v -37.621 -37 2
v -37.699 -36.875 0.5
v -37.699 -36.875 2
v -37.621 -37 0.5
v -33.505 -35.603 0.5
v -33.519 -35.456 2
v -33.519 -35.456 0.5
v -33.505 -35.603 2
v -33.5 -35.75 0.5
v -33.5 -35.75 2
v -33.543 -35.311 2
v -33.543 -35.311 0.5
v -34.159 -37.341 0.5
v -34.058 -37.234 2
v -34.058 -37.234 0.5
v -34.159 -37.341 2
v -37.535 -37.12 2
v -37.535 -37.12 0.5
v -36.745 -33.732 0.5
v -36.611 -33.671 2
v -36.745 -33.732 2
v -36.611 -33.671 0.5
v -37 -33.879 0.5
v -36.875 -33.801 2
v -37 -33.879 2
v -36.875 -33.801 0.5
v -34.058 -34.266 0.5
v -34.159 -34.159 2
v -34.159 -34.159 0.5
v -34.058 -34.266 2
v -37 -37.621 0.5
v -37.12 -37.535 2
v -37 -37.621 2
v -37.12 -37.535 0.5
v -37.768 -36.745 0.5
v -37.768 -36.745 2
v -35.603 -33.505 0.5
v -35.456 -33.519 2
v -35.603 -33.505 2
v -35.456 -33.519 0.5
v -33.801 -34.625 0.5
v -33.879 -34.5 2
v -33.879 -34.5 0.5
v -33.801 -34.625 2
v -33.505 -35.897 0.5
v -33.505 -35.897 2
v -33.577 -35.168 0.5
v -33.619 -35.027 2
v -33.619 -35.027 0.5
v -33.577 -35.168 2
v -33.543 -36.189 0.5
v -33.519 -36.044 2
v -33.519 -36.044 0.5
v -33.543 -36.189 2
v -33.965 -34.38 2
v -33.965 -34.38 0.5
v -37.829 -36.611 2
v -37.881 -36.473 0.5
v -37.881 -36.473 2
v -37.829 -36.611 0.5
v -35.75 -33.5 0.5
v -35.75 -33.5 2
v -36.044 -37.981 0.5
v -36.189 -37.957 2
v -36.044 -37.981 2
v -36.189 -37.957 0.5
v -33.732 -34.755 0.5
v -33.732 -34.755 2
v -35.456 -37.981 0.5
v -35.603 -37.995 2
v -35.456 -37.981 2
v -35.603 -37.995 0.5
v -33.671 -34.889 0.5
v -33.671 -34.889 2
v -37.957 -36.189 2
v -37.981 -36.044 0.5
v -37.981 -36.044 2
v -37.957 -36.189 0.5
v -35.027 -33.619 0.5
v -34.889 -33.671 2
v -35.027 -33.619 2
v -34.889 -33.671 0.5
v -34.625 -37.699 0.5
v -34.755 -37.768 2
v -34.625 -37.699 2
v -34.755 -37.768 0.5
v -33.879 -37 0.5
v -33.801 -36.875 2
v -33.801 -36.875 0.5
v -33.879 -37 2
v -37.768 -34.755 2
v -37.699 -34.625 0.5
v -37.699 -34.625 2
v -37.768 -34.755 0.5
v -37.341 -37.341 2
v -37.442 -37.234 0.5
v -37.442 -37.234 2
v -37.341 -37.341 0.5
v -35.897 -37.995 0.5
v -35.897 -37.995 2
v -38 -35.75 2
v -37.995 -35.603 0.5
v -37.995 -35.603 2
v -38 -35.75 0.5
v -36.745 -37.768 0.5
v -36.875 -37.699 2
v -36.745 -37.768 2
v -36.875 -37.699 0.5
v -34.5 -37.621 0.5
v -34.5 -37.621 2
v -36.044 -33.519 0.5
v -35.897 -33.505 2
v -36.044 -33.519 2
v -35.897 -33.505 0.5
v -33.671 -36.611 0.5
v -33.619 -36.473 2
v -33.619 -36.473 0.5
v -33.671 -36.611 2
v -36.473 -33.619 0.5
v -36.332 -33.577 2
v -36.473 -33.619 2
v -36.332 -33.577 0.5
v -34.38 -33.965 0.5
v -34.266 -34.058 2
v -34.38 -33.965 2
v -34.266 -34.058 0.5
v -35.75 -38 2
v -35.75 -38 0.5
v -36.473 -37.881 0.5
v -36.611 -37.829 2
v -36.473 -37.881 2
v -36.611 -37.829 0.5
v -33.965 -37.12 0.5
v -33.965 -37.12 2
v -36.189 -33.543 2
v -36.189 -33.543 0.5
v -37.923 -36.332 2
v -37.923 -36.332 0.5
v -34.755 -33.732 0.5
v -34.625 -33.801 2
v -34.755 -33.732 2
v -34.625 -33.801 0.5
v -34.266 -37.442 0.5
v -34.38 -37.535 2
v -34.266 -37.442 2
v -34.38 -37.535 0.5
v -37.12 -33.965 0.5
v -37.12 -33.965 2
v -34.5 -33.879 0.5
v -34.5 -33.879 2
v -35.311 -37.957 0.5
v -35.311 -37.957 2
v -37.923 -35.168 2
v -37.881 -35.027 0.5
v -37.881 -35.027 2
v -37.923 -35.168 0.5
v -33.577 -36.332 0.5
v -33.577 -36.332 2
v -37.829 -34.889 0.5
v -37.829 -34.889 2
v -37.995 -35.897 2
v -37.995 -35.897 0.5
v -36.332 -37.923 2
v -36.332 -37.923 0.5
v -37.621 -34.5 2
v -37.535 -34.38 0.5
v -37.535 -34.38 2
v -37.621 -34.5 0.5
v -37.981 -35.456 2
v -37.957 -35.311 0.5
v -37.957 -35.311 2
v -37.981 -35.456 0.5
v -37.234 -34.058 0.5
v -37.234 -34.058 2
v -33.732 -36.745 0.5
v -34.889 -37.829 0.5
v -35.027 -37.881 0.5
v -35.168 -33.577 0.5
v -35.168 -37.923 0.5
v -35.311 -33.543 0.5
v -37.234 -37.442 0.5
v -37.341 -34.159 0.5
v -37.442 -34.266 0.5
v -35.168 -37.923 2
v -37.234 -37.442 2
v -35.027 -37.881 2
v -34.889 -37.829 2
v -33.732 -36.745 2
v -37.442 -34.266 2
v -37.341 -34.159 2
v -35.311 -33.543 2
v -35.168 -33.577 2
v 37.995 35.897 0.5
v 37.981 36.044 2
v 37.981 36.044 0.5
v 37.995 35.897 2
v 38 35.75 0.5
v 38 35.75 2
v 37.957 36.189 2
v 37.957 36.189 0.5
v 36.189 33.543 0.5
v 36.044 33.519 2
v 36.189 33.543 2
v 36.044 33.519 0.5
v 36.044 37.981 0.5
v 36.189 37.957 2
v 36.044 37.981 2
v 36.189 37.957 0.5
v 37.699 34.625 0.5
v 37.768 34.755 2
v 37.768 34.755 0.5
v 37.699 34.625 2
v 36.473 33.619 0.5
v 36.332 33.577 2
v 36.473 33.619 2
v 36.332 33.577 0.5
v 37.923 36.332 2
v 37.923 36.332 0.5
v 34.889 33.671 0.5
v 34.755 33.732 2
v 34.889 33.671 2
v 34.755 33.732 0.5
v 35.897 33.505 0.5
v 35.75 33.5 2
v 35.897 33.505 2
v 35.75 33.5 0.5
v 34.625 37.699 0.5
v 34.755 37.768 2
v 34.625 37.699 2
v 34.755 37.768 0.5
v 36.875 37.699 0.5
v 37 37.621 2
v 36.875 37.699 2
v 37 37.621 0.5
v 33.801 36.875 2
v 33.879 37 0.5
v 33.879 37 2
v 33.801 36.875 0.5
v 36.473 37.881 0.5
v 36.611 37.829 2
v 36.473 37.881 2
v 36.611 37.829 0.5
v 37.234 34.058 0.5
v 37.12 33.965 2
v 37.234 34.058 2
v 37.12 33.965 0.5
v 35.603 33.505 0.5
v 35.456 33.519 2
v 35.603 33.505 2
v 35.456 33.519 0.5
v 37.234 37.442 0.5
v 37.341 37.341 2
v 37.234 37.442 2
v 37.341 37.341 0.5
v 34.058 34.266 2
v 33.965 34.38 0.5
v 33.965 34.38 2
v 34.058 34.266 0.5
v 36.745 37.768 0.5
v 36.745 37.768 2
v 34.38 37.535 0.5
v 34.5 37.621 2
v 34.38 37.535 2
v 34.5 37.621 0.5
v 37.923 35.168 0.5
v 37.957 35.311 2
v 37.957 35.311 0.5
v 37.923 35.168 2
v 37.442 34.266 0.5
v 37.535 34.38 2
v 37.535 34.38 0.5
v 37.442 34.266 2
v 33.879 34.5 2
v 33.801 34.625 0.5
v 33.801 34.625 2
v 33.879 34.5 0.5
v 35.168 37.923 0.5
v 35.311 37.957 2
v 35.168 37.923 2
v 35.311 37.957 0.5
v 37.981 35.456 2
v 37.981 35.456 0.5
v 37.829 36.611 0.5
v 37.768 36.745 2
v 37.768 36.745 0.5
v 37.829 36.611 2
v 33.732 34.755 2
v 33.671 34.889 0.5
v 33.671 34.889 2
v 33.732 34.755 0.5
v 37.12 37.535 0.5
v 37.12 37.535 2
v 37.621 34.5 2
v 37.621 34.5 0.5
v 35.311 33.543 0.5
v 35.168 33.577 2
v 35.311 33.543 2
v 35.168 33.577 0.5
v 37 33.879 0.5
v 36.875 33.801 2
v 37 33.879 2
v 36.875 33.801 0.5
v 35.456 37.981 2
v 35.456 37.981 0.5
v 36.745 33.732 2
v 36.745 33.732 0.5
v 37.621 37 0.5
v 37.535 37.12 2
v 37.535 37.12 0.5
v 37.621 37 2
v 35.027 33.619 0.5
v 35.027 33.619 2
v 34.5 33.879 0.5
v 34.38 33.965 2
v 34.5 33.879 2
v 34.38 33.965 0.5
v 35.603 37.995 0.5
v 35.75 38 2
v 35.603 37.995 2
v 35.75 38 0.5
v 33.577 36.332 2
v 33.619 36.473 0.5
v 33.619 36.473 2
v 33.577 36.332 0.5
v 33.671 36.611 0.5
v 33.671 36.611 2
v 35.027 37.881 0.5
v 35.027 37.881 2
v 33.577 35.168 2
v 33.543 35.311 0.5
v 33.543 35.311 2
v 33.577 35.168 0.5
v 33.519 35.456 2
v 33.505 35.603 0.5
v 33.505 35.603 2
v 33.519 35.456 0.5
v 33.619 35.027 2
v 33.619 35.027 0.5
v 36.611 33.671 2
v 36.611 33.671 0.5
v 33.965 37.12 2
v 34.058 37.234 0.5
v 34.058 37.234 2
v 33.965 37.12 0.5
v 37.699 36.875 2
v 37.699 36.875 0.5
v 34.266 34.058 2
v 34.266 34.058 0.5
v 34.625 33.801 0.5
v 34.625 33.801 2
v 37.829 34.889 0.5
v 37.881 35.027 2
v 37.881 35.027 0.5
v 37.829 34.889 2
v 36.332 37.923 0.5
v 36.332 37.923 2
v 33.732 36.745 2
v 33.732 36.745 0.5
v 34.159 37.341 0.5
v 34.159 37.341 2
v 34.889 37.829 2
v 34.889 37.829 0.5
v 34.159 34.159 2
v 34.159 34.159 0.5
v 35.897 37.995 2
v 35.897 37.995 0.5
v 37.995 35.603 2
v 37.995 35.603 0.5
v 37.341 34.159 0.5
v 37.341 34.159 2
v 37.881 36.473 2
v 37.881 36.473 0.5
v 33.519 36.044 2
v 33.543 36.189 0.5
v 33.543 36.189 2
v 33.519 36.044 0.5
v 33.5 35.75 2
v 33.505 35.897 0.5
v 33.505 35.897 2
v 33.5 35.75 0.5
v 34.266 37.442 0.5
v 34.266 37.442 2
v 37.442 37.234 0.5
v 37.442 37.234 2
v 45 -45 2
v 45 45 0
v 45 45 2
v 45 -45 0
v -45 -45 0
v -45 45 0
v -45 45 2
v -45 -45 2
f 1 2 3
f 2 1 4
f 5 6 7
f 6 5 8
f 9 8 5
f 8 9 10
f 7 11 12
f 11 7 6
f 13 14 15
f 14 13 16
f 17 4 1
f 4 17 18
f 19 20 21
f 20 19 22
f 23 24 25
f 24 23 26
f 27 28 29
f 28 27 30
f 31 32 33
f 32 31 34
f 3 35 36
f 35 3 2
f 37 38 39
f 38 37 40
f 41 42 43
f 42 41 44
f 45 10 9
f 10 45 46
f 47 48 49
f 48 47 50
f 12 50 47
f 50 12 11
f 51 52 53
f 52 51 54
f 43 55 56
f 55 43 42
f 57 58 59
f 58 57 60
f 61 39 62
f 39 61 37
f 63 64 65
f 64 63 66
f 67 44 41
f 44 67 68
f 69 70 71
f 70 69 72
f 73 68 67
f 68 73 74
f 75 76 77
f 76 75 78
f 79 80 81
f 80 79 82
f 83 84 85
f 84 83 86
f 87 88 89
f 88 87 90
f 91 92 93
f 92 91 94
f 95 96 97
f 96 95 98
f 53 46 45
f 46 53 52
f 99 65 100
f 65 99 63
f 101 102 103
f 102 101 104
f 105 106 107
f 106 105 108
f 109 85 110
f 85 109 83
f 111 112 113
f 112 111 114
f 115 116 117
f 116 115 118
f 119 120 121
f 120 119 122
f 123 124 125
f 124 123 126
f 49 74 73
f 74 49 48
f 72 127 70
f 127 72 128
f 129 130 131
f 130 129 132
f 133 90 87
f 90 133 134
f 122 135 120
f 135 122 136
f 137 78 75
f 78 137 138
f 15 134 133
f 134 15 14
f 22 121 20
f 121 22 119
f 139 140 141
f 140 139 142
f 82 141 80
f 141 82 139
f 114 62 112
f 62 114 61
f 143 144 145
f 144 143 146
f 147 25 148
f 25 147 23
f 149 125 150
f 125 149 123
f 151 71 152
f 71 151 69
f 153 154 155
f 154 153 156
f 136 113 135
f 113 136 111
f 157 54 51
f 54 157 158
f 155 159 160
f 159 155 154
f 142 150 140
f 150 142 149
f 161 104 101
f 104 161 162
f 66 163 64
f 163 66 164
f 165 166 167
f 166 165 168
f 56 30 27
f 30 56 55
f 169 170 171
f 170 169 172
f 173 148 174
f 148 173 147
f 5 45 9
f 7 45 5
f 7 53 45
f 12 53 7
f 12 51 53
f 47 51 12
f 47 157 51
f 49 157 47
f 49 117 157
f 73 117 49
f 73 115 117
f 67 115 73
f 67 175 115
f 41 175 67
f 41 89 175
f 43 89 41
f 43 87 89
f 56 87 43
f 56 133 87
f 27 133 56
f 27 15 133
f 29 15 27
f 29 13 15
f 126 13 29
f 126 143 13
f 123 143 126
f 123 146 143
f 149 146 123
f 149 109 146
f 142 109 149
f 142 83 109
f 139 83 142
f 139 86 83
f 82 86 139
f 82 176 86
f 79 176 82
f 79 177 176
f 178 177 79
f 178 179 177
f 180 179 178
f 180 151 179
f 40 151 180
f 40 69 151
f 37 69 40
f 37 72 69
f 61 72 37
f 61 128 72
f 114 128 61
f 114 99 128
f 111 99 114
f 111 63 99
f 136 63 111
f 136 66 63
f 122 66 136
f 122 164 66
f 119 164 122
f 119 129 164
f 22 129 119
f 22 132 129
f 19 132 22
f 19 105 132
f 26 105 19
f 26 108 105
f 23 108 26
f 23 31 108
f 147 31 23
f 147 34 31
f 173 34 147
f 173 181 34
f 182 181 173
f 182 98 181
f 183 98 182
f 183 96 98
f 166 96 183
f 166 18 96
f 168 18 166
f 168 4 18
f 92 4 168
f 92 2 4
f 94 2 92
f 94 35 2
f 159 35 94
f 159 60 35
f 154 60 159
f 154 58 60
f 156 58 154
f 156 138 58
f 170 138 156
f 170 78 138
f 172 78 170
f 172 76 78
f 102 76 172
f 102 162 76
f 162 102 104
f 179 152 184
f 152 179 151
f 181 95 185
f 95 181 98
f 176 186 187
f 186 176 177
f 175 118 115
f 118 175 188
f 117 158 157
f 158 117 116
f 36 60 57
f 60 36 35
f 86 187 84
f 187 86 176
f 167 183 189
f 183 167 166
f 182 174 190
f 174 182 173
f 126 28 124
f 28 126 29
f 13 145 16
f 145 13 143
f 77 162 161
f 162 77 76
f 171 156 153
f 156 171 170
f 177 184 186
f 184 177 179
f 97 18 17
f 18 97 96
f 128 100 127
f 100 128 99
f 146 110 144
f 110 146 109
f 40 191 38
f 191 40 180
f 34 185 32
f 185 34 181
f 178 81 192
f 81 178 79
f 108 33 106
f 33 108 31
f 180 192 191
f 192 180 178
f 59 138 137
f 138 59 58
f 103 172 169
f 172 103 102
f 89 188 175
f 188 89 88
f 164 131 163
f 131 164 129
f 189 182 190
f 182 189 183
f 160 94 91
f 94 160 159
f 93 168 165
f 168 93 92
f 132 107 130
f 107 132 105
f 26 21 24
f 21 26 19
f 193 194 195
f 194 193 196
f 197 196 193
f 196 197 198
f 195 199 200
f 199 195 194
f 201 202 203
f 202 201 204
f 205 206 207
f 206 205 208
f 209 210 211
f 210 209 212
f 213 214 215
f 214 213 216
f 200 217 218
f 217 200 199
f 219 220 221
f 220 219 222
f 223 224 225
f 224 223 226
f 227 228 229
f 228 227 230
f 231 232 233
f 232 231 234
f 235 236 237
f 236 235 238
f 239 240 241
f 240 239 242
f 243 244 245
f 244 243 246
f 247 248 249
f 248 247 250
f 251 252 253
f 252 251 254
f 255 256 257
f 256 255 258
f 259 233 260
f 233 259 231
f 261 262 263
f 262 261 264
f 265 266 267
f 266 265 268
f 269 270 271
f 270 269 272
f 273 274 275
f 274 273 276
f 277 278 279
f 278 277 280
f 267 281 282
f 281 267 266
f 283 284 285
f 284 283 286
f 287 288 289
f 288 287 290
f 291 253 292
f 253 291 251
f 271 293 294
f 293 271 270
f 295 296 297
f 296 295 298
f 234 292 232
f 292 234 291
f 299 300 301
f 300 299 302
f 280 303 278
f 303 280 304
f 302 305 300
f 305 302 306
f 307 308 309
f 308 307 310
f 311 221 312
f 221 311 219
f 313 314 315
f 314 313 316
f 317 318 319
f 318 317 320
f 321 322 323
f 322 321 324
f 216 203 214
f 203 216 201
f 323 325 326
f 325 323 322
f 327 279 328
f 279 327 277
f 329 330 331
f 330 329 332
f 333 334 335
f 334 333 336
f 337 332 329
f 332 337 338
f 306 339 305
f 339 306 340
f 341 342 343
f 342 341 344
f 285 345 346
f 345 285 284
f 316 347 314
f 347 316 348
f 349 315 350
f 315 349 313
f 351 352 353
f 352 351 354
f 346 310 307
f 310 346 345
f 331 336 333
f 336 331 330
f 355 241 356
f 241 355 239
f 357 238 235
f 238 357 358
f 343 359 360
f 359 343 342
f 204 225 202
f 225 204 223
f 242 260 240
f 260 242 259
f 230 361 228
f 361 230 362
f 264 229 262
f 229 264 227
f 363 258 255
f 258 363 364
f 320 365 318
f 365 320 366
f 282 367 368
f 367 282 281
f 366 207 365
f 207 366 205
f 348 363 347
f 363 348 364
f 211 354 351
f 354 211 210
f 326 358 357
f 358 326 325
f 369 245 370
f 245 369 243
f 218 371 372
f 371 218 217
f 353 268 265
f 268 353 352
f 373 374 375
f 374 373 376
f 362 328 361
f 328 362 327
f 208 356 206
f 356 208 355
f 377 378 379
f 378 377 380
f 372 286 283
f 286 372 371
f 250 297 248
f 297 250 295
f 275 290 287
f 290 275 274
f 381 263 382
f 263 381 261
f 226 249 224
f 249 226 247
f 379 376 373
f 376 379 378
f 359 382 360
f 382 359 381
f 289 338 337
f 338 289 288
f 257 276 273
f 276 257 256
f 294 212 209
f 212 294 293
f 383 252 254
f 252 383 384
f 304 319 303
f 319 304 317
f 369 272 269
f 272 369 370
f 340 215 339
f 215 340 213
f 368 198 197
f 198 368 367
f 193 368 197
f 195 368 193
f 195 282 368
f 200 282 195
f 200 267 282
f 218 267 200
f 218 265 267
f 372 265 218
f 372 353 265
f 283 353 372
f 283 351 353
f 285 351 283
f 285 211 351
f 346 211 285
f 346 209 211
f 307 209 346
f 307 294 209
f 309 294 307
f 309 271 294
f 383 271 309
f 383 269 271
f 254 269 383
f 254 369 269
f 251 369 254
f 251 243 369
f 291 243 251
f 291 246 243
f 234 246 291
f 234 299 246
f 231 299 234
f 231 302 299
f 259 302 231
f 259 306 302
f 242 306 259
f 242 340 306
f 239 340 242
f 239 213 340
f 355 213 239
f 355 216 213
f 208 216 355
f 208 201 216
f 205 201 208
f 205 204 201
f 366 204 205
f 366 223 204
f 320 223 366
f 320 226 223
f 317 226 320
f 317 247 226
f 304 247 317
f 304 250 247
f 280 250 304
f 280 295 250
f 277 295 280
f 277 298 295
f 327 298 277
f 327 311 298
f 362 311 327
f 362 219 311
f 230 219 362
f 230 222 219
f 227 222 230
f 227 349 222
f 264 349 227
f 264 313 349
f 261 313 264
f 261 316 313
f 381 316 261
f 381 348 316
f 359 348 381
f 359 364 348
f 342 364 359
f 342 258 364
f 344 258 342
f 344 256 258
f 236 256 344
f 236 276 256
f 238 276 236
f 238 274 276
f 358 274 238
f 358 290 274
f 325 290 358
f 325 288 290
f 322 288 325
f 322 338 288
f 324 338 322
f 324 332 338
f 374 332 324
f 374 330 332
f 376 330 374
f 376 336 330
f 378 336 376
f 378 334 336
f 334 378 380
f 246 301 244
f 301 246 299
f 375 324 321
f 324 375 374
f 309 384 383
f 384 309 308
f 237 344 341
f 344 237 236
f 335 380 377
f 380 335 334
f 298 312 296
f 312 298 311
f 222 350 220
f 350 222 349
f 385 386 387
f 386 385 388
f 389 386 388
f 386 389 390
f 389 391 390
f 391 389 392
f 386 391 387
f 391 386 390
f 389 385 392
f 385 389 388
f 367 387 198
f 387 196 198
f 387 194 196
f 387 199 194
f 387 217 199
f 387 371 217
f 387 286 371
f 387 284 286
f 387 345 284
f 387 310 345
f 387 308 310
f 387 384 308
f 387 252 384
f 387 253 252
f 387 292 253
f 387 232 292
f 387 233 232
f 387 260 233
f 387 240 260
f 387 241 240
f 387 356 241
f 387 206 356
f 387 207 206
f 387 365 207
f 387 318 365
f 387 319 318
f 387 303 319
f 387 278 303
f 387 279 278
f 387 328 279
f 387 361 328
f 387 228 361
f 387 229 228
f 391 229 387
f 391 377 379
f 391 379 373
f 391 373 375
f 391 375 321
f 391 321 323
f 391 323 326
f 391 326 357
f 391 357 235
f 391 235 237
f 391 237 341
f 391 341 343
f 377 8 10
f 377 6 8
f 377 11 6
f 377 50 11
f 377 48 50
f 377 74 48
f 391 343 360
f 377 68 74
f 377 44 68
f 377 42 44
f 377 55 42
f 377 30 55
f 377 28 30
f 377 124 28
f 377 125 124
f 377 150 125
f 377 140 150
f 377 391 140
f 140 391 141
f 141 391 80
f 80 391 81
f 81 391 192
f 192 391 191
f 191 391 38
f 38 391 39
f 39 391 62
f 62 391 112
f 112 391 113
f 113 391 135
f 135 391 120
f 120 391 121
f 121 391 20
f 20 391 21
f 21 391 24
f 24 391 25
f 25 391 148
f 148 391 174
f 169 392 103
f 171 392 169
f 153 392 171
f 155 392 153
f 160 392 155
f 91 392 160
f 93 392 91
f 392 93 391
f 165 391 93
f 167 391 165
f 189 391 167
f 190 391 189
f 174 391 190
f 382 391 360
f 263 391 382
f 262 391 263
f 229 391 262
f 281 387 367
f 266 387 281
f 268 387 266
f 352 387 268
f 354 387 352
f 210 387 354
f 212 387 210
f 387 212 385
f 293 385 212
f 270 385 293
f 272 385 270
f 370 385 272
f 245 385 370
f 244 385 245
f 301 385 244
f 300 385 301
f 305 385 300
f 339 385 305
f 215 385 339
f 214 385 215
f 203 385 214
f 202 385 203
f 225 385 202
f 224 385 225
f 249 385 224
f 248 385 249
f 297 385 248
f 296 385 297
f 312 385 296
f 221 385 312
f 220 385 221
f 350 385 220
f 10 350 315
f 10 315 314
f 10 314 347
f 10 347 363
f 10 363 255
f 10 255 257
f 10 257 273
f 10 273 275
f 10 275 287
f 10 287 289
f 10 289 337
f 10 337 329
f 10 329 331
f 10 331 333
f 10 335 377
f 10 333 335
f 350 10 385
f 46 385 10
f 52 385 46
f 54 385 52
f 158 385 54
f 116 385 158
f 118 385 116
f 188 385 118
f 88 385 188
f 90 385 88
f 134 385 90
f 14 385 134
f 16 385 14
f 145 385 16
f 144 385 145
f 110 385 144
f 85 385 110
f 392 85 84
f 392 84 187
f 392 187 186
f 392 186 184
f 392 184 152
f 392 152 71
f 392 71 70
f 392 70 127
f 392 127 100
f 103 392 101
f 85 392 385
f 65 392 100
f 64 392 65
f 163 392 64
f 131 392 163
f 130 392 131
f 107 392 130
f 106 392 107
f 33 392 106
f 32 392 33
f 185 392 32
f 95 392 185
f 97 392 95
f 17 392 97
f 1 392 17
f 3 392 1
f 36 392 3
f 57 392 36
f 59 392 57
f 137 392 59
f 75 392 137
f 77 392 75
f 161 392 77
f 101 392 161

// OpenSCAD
// DIY magnetic stirrer housing for 80 mm PC case fan
// Print orientation: top plate on bed (z = 0), walls rise to open top (z = 40)

// ---------- Parameters ----------
fan_d        = 80;    // fan diameter (mm)
outer_x      = 90;    // outer size in X (mm)
outer_y      = 90;    // outer size in Y (mm)
top_t        = 2;     // top plate thickness (mm)
wall_t       = 2.5;   // wall thickness (mm)
open_h       = 40 - top_t; // open top height from plate top (mm)
screw_d      = 4.5;   // M4 screw hole diameter (mm)
screw_n      = 4;     // number of screw holes
screw_pitch  = 71.5;  // square pattern side length (mm)
notch_w      = 12;    // cable notch width (mm)
notch_depth  = 8;     // cable notch depth from open edge (mm)
eps          = 0.5;   // cutter overshoot past faces (mm)
$fn          = 96;    // curve resolution

// ---------- Model ----------
difference() {
    // Outer block
    translate([-outer_x/2, -outer_y/2, 0])
        cube([outer_x, outer_y, top_t + open_h]);

    // Open top (no lid)
    translate([-outer_x/2, -outer_y/2, top_t])
        cube([outer_x, outer_y, open_h + eps]);

    // Screw holes through top plate
    for (i = [0 : screw_n - 1]) {
        a = (i < 2) ? 0 : 1;   // row 0 or 1 (Y)
        b = (i < 2) ? 0 : 1;   // col 0 or 1 (X)
        translate([b ? screw_pitch/2 : -screw_pitch/2,
                   a ? screw_pitch/2 : -screw_pitch/2,
                   eps])
            cylinder(d = screw_d, h = top_t + 1);
    }

    // Cable notch in one wall (centred along wall, z = 32..40)
    translate([-outer_x/2, -notch_w/2, top_t + open_h - notch_depth])
        cube([outer_x, notch_w, notch_depth + eps]);
}
